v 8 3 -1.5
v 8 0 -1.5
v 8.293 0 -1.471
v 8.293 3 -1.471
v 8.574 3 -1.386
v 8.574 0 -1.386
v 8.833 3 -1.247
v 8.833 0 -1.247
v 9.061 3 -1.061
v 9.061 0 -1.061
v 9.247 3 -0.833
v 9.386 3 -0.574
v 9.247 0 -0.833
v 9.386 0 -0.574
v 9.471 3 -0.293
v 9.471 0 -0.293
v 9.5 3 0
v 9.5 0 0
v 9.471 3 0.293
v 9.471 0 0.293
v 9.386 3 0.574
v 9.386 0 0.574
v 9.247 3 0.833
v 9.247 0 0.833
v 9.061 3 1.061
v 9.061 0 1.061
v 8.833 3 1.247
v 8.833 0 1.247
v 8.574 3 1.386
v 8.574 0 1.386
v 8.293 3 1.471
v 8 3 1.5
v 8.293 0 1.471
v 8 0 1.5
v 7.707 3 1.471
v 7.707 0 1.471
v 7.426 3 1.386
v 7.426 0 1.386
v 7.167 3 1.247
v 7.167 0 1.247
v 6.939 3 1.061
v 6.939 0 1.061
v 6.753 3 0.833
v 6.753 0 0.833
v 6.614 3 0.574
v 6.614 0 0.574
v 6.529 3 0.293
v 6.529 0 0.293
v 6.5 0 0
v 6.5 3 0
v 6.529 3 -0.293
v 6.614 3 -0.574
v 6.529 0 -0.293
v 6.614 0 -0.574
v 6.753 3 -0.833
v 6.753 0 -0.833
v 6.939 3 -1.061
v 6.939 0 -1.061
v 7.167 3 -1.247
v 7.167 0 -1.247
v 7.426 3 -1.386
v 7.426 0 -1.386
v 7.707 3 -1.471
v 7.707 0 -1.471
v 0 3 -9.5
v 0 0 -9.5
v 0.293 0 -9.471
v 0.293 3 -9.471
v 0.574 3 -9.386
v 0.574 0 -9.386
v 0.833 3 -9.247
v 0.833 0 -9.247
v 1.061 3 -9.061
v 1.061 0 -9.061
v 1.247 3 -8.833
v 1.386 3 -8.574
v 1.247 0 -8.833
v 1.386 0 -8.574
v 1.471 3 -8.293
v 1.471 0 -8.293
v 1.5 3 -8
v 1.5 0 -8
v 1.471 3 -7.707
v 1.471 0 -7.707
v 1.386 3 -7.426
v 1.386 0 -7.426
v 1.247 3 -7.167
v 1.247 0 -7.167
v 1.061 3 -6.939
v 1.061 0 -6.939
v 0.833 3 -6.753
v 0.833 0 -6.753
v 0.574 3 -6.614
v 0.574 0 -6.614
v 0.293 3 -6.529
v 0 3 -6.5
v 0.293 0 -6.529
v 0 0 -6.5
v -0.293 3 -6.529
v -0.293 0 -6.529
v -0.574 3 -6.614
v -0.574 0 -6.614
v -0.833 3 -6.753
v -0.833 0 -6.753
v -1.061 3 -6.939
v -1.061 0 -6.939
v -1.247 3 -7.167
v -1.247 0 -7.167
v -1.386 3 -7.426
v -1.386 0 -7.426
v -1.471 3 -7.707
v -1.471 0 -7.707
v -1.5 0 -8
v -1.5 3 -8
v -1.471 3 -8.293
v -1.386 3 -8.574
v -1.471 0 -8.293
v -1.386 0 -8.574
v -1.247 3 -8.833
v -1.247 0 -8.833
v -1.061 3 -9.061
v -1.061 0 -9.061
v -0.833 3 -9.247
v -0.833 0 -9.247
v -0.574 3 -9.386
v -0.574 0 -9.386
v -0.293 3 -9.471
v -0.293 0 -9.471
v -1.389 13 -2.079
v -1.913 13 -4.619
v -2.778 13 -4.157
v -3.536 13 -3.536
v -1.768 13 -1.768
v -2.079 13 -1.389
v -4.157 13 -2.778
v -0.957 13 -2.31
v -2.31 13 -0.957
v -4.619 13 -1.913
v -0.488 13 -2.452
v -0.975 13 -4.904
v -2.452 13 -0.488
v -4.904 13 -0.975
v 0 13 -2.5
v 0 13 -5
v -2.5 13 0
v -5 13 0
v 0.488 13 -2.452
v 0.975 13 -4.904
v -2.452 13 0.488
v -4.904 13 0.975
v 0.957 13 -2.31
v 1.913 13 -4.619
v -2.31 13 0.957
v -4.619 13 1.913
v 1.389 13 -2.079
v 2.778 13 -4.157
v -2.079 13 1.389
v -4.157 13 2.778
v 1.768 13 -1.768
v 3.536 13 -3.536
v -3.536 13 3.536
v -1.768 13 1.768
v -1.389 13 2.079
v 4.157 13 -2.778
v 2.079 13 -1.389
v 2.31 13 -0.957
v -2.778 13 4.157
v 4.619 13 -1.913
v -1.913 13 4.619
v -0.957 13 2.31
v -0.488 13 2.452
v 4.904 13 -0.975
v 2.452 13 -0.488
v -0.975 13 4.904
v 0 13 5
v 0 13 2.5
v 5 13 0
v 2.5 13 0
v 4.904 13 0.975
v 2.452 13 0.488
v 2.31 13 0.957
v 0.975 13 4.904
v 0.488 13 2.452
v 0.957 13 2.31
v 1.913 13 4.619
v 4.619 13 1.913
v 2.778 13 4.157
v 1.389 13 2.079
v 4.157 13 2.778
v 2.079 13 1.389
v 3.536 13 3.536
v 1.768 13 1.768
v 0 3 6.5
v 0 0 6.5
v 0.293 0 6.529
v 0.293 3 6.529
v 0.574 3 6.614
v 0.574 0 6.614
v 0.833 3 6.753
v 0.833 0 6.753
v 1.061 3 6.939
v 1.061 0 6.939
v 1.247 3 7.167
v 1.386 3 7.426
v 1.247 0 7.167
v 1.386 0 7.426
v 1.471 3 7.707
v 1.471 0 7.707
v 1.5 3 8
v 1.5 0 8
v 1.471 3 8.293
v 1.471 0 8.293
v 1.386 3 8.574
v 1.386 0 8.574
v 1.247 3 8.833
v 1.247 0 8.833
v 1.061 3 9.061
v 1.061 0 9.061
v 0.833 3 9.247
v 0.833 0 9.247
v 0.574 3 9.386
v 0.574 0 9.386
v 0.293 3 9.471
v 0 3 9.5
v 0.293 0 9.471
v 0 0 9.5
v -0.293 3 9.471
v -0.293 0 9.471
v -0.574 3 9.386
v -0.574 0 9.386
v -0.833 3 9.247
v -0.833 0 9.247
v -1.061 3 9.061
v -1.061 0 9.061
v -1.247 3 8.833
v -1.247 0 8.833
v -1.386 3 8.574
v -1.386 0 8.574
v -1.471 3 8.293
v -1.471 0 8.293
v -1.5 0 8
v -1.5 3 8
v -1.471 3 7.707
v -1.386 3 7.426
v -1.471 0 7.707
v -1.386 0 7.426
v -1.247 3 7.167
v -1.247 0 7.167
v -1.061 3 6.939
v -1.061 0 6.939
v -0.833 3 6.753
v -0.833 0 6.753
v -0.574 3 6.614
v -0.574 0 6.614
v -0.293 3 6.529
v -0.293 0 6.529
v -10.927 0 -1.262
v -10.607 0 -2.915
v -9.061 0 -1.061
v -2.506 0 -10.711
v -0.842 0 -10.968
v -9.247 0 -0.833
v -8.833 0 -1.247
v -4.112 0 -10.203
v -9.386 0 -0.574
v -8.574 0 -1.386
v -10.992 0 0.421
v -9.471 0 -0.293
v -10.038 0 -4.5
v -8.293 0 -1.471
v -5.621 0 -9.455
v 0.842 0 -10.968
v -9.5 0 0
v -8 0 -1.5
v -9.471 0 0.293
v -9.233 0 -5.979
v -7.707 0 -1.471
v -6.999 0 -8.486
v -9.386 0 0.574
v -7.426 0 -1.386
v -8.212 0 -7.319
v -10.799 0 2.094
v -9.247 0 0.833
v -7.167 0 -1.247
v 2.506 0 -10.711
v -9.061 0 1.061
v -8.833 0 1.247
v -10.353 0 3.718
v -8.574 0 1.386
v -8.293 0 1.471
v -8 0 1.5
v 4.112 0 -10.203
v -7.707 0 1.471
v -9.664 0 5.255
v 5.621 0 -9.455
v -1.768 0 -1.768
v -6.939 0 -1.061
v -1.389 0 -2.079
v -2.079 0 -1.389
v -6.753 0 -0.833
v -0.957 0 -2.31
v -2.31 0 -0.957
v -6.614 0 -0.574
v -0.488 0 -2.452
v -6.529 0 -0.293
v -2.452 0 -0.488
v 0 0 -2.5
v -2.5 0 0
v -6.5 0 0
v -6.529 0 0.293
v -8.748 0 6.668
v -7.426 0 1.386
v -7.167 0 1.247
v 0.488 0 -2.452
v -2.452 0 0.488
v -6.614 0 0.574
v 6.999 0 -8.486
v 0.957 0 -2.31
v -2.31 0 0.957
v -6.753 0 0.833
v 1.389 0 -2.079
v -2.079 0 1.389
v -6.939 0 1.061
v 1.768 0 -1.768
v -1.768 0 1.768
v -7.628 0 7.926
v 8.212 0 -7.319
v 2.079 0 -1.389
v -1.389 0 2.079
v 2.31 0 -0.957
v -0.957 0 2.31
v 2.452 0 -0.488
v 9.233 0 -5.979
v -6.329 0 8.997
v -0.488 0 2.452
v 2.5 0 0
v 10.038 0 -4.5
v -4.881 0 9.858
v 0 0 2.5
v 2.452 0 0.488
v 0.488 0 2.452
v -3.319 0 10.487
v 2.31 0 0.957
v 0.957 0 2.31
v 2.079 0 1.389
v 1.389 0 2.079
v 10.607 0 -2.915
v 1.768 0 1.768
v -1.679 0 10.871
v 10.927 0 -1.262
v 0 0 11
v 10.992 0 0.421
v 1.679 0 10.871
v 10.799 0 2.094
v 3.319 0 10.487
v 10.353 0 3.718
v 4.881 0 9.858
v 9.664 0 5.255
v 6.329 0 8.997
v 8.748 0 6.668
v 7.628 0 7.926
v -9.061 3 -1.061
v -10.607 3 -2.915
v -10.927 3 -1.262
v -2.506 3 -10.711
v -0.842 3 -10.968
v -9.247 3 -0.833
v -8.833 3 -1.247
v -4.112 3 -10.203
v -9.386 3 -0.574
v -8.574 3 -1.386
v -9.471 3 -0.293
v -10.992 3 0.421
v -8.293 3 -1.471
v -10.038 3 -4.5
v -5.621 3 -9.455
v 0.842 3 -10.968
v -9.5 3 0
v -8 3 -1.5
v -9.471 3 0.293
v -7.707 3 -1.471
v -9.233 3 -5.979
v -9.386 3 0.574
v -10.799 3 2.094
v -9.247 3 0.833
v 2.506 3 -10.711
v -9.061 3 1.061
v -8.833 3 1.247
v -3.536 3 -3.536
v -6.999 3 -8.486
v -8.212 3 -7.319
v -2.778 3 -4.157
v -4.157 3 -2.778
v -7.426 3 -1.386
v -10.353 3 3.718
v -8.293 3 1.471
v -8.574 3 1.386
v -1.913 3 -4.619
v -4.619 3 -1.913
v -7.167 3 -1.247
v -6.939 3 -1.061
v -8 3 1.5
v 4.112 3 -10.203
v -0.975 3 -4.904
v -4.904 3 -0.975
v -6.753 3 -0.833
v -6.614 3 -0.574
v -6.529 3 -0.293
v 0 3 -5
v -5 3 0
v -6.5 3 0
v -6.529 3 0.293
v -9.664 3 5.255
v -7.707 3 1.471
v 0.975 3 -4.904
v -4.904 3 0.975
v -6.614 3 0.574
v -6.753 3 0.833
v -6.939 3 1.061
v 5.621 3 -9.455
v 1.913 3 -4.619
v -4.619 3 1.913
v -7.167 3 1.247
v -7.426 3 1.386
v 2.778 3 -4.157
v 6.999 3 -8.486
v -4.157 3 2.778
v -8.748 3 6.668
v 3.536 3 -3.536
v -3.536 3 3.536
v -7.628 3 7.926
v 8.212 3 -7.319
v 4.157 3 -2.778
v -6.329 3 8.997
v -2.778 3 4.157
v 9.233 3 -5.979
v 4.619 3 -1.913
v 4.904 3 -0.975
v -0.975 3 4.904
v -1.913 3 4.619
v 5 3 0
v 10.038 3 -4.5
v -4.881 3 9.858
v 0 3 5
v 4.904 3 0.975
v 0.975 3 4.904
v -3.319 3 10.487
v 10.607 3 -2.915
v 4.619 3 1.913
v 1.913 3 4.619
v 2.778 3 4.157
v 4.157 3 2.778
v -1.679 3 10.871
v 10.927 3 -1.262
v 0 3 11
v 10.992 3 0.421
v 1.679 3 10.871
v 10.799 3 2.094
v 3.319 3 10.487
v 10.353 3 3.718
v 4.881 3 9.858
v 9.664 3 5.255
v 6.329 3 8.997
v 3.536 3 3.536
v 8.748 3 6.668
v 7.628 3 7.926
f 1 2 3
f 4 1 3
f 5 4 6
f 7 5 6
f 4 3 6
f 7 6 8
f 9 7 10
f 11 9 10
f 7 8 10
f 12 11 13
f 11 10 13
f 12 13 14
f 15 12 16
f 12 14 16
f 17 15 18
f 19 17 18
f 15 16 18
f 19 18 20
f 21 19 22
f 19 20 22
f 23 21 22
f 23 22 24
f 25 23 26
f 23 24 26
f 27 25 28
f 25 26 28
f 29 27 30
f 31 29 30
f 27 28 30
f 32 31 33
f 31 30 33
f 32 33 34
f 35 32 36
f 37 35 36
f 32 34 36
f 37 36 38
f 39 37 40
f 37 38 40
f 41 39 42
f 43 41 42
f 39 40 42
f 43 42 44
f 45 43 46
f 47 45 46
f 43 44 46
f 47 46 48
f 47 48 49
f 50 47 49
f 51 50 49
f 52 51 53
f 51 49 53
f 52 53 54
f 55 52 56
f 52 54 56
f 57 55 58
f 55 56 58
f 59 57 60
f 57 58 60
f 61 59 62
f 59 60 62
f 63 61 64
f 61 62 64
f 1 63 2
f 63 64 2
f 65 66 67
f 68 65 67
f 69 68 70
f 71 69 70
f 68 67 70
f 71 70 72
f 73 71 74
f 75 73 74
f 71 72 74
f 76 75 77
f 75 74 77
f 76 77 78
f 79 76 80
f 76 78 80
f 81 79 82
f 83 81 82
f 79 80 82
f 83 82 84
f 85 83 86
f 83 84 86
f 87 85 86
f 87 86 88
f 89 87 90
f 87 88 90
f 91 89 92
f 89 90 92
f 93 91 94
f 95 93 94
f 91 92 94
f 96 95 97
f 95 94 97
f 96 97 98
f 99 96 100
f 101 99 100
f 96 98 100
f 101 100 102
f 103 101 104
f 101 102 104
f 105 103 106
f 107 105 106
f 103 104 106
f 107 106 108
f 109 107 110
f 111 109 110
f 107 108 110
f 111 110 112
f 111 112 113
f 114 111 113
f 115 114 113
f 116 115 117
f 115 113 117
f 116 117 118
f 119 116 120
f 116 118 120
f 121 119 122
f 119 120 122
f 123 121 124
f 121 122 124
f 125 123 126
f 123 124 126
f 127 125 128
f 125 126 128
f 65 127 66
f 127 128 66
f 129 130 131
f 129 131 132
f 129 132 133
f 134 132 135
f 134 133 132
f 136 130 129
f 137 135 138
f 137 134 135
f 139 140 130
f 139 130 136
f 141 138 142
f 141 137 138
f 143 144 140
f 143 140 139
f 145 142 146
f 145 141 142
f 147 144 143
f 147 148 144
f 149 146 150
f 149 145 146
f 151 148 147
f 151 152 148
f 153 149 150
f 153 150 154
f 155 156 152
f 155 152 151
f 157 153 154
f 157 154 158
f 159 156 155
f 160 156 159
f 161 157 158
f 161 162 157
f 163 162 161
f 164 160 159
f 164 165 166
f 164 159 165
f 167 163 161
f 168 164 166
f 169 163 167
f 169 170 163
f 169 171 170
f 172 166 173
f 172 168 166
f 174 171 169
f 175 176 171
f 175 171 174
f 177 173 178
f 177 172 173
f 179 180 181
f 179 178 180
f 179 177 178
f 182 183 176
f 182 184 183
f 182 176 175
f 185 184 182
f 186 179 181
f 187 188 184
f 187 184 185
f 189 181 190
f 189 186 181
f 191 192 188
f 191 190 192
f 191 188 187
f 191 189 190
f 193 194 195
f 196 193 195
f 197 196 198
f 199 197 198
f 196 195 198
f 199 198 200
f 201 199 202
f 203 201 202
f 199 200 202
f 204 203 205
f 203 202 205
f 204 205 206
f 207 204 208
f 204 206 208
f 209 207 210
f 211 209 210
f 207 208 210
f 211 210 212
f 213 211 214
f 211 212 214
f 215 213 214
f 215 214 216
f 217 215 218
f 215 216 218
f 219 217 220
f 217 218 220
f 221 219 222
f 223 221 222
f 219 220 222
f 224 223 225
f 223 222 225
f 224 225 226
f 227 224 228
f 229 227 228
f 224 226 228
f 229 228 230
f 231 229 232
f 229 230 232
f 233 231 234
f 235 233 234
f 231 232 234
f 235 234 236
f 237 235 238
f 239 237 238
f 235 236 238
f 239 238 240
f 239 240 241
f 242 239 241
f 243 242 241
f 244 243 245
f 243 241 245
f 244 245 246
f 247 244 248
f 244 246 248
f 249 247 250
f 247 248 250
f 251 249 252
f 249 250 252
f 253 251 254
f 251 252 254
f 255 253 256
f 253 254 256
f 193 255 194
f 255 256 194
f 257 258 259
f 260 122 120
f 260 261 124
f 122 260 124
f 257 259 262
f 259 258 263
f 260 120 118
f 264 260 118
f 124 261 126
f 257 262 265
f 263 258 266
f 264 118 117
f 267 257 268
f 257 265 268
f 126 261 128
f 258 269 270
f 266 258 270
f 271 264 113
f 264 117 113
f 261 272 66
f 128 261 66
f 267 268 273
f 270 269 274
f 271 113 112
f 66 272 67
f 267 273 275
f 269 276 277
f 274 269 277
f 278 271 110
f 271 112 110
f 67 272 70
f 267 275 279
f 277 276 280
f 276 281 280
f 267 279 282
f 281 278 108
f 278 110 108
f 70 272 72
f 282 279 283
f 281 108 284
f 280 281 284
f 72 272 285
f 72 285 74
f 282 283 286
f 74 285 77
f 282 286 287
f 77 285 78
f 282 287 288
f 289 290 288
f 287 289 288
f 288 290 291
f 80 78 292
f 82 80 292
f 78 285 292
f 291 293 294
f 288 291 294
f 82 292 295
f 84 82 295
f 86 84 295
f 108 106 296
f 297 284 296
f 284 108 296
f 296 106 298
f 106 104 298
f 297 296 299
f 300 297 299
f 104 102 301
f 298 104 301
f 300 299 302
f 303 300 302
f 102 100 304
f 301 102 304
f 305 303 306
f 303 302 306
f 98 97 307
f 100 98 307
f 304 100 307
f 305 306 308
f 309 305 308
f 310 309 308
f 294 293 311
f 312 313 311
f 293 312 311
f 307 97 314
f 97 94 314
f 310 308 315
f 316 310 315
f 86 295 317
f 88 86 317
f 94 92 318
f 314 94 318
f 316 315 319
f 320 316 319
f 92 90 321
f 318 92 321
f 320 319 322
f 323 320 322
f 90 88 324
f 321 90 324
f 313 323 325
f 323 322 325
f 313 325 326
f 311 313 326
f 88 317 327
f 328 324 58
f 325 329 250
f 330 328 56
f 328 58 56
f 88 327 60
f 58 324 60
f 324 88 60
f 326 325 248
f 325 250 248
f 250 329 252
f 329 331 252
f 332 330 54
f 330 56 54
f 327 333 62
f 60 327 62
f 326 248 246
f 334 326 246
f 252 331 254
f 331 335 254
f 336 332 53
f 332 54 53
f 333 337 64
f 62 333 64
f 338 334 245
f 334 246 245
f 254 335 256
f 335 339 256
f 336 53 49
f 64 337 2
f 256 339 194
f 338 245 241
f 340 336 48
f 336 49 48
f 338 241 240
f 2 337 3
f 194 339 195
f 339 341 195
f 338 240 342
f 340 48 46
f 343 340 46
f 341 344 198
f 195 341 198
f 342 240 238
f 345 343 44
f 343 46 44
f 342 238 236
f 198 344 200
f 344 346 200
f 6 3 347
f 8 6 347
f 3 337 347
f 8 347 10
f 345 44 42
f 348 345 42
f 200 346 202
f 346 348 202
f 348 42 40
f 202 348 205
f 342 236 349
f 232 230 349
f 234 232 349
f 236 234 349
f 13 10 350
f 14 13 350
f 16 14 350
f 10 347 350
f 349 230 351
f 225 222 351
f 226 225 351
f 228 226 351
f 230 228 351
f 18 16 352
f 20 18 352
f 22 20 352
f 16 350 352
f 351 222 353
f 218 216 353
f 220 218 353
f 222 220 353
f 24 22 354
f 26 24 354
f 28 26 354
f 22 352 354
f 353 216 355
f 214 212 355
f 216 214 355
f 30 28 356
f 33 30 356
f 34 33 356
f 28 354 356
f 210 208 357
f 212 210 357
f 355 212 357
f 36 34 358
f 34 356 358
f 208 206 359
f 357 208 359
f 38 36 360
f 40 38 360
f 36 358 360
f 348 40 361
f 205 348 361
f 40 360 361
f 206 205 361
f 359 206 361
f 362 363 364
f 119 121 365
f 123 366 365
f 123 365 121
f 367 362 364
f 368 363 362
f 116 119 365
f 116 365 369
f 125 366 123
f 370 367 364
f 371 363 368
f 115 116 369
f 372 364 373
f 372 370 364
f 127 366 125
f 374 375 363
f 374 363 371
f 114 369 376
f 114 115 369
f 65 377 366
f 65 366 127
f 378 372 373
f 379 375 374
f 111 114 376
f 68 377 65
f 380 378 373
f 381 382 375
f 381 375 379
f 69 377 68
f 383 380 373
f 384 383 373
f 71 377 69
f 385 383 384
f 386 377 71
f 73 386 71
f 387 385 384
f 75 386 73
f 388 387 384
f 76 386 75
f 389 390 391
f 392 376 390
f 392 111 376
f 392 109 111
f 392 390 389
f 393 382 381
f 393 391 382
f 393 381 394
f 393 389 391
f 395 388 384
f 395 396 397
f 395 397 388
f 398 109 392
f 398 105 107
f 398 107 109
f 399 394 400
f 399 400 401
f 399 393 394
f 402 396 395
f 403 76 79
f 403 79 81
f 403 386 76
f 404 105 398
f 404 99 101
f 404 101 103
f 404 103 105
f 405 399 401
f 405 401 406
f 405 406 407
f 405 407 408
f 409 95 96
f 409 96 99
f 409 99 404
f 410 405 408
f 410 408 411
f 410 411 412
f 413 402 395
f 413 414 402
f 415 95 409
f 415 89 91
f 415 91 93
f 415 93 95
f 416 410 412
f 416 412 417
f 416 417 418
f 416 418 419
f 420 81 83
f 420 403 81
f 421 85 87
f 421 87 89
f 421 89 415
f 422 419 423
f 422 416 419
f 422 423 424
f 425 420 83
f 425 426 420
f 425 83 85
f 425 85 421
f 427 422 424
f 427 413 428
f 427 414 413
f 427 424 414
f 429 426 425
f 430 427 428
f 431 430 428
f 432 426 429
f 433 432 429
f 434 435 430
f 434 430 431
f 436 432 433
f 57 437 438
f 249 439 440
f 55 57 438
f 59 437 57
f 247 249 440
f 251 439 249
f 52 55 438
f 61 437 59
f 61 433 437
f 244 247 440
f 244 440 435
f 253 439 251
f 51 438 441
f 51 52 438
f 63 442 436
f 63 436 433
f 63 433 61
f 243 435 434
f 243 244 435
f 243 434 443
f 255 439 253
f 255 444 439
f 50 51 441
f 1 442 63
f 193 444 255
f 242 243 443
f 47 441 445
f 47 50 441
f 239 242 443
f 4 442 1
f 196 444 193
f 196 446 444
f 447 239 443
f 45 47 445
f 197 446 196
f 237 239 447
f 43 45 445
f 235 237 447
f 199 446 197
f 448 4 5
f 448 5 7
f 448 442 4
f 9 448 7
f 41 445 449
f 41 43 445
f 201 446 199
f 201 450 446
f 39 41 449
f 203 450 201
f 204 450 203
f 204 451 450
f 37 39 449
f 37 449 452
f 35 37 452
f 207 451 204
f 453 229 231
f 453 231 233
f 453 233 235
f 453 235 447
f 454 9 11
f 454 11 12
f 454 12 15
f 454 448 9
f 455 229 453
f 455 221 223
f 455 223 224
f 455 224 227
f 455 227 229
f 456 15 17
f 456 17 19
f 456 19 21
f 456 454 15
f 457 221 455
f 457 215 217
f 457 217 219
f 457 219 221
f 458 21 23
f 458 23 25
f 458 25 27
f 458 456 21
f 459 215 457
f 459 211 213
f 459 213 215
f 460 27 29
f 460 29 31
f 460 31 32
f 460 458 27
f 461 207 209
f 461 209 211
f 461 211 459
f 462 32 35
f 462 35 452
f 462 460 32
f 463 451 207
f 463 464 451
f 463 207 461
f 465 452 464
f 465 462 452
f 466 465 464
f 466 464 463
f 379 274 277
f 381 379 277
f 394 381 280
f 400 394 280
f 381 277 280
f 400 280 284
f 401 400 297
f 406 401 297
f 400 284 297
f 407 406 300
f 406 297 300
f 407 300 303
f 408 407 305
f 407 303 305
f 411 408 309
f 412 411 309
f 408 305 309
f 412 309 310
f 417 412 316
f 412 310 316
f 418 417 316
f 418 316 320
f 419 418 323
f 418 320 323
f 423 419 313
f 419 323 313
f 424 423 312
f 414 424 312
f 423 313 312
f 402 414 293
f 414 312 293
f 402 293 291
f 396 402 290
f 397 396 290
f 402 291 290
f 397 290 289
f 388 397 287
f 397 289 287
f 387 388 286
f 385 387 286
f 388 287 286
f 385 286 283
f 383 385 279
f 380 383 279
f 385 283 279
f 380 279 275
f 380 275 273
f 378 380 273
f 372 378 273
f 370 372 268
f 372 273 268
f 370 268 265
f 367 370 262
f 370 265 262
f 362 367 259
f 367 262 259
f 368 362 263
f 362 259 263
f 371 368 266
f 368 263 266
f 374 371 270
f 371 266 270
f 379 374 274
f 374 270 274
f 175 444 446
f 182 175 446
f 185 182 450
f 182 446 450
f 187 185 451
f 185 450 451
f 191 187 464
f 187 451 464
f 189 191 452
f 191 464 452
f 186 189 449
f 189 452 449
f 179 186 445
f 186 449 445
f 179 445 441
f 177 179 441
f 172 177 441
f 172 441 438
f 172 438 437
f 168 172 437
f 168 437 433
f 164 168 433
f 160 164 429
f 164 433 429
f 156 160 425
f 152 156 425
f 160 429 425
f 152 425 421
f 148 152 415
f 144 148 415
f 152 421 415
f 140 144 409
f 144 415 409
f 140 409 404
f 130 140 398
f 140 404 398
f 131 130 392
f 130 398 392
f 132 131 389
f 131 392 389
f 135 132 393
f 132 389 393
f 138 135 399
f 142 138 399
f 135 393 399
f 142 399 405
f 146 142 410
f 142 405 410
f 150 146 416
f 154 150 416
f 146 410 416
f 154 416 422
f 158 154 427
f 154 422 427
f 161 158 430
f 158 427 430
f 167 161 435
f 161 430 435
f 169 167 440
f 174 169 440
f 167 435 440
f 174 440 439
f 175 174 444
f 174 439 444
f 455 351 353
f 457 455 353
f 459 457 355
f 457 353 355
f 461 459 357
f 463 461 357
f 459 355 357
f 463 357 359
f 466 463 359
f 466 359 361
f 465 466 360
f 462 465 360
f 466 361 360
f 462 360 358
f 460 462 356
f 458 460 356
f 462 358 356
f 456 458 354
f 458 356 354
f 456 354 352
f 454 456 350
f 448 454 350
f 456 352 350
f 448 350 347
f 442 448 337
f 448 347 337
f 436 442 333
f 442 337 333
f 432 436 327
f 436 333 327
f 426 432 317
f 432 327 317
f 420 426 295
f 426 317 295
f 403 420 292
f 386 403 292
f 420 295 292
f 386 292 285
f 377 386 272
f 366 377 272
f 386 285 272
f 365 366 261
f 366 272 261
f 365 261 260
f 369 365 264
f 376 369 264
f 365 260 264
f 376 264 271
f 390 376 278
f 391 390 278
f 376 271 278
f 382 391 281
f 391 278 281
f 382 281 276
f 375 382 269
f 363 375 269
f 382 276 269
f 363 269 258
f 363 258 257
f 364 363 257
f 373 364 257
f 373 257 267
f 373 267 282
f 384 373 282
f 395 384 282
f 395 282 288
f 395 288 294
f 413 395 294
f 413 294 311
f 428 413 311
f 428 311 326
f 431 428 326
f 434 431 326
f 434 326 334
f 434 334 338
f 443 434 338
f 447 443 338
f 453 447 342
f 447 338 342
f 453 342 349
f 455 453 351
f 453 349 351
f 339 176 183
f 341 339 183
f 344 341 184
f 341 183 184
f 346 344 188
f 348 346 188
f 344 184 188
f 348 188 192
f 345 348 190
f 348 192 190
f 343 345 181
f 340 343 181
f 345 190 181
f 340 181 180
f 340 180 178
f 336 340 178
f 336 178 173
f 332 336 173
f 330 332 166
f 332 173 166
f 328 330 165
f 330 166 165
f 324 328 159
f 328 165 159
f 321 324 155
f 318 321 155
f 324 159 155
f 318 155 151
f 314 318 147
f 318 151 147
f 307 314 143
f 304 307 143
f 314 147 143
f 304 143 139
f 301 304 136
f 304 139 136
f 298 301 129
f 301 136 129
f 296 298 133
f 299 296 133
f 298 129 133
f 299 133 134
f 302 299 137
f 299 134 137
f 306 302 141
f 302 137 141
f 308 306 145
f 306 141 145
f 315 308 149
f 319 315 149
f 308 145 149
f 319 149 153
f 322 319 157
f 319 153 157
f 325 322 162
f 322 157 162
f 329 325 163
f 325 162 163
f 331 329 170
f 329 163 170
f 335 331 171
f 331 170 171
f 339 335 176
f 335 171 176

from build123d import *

# Parameters (mm, degrees)
SKETCH_1_R          = 11
EXTRUDE_1_DEPTH     = 3
SKETCH_2_R          = 5
EXTRUDE_2_DEPTH     = 10
SKETCH_3_R          = 2.5
CUT_EXTRUDE_1_DEPTH = 13
SKETCH_4_R          = 1.5
CUT_EXTRUDE_2_DEPTH = 3


with BuildPart() as part:
    # 草图1 → 凸台-拉伸1 (new body)
    with BuildSketch(Plane(origin=(0, 0, 0), x_dir=(1, 0, 0), z_dir=(0, 1, 0))):
        with Locations(Location((0, 0, 0), (0, 0, 270))):
            Circle(SKETCH_1_R)
    extrude(amount=EXTRUDE_1_DEPTH)

    # 草图2 → 凸台-拉伸2 (add)
    with BuildSketch(Plane(origin=(0, 3, 0), x_dir=(1, 0, 0), z_dir=(0, 1, 0))):
        with Locations(Location((0, 0, 0), (0, 0, 270))):
            Circle(SKETCH_2_R)
    extrude(amount=EXTRUDE_2_DEPTH)

    # 草图3 → 切除-拉伸1 (cut)
    with BuildSketch(Plane(origin=(0, 13, 0), x_dir=(1, 0, 0), z_dir=(0, 1, 0))):
        with Locations(Location((0, 0, 0), (0, 0, 270))):
            Circle(SKETCH_3_R)
    extrude(amount=-CUT_EXTRUDE_1_DEPTH, mode=Mode.SUBTRACT)

    # 草图4 → 切除-拉伸2 (cut)
    with BuildSketch(Plane.XZ):
        with Locations(Location((0, 8, 0), (0, 0, 270))):
            Circle(SKETCH_4_R)
        with Locations(Location((8, 0, 0), (0, 0, 270))):
            Circle(SKETCH_4_R)
        with Locations(Location((0, -8, 0), (0, 0, 270))):
            Circle(SKETCH_4_R)
        with Locations(Location((-8, 0, 0), (0, 0, 270))):
            Circle(SKETCH_4_R)
    extrude(amount=-CUT_EXTRUDE_2_DEPTH, mode=Mode.SUBTRACT)


solid = part.part
